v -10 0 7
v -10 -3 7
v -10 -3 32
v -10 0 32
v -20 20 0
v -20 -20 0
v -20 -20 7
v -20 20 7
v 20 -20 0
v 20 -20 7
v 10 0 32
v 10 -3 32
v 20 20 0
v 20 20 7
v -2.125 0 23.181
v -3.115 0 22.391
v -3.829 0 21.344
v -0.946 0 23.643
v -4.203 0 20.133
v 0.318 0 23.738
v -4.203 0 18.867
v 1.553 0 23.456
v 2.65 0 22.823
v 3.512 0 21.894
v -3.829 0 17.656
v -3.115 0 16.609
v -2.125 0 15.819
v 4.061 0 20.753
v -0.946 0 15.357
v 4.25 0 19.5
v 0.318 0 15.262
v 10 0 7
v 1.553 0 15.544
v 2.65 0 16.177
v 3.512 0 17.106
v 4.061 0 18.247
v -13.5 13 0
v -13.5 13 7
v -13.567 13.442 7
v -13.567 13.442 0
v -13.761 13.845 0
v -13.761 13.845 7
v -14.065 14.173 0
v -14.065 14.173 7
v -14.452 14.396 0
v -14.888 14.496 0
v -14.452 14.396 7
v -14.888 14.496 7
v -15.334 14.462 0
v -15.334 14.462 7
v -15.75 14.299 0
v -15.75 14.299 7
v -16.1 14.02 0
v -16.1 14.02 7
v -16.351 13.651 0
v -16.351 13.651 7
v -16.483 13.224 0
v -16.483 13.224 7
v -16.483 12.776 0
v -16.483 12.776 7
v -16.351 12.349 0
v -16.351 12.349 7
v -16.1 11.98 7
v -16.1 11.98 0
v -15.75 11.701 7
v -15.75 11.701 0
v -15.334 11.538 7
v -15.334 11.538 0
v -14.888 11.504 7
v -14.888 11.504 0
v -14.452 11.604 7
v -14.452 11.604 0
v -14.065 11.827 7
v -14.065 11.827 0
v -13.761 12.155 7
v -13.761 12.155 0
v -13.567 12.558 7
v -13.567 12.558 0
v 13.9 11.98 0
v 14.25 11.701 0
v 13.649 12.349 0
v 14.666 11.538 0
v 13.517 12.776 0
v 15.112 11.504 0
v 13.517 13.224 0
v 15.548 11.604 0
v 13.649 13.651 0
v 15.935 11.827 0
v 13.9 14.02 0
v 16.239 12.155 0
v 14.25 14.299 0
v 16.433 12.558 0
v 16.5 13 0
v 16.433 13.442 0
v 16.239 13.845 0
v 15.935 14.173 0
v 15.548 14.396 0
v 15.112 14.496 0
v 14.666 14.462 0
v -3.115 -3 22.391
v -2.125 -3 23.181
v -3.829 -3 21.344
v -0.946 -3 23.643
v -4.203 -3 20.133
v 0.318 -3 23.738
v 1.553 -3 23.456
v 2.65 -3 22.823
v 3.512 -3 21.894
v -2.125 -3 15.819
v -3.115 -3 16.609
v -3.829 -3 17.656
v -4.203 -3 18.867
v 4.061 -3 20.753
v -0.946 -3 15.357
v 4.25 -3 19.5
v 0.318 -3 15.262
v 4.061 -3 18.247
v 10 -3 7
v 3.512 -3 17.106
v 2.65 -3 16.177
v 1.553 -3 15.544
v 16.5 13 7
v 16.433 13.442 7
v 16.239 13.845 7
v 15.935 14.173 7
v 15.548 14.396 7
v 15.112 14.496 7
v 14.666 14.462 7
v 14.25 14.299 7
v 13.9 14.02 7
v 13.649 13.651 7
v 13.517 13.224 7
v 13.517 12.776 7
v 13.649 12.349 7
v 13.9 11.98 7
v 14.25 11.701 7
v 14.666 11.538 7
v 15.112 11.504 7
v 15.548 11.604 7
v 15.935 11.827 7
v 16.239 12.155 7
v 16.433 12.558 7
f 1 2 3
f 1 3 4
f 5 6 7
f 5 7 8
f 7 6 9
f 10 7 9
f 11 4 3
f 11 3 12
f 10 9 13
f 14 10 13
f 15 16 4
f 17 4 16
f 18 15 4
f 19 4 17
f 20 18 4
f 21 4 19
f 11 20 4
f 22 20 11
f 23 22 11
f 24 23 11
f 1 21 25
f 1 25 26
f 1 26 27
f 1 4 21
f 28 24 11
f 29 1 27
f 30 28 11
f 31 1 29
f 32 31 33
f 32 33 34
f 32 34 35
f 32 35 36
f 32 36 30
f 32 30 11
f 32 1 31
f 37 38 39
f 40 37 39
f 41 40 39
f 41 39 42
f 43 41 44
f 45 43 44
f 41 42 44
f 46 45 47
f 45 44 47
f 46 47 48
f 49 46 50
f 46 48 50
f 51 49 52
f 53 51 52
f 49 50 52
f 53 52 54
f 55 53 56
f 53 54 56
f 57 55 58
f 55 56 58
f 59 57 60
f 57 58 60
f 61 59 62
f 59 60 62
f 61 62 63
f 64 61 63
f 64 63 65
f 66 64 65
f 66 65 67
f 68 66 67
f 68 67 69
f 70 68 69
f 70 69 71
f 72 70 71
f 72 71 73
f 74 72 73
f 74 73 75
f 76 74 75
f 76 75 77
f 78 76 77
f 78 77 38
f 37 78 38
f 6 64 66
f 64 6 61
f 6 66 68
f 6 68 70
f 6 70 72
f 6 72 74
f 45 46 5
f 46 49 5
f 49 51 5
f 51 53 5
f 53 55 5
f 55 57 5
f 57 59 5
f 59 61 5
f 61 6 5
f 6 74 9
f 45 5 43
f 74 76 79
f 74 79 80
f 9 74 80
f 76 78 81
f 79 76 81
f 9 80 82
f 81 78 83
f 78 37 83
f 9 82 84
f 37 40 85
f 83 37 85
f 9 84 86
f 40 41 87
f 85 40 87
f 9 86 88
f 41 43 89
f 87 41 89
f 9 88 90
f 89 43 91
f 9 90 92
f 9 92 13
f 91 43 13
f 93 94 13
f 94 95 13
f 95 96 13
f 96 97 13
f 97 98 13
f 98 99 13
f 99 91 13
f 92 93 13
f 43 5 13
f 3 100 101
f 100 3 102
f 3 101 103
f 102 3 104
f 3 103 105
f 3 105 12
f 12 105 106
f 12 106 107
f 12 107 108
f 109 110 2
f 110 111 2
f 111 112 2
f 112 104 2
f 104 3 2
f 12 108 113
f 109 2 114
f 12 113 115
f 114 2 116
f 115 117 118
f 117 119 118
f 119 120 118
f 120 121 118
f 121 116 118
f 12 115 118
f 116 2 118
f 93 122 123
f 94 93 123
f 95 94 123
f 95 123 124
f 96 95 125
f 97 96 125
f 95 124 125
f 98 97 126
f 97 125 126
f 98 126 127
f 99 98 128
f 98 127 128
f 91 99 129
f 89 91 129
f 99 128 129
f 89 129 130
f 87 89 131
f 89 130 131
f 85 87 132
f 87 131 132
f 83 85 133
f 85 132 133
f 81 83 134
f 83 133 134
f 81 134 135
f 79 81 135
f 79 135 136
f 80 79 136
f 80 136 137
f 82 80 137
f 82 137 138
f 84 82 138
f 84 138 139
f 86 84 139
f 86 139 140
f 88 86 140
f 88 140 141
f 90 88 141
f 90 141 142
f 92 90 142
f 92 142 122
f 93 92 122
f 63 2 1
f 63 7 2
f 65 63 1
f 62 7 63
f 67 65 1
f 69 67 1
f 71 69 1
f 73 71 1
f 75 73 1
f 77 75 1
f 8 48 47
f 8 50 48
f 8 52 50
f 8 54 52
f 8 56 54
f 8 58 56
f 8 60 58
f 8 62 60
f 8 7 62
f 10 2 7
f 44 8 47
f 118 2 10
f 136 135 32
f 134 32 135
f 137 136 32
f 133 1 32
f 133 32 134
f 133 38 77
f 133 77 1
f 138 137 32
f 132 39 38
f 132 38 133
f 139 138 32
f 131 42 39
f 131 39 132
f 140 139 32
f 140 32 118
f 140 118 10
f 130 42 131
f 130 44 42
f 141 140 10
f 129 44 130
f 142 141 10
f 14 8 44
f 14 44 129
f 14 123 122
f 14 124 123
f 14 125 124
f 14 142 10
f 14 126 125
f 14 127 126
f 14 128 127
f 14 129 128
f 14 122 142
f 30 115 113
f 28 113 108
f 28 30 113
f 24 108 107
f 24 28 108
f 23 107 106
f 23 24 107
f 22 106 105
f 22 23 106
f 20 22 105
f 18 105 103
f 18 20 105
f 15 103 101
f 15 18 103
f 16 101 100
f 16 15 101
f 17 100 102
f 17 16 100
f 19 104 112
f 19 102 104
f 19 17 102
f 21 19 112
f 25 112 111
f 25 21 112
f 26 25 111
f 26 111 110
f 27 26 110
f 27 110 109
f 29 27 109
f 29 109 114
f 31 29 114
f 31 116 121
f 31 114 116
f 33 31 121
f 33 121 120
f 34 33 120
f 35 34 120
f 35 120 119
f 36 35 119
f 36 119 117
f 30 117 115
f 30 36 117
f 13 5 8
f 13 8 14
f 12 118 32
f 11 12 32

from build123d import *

# Parameters (mm, degrees)
F0_W     = 40
F0_H     = 40
F1_DEPTH = 7
F3_W     = 20
F3_H     = 3
F4_DEPTH = 25
F5_R     = 1.5
F6_DEPTH = 25
F7_R     = 4.25
F8_DEPTH = 25


with BuildPart() as f1:
    # F0 (on Top) → F1 (new body)
    with BuildSketch(Plane.XY):
        Rectangle(F0_W, F0_H)
    extrude(amount=F1_DEPTH)

    # F3 (on offset) → F4 (join)
    with BuildSketch(Plane.XY.offset(7)):
        with Locations((0, -1.5)):
            Rectangle(F3_W, F3_H)
    extrude(amount=F4_DEPTH)

    # F5 (on offset) → F6 (cut)
    with BuildSketch(Plane.XY.offset(7)):
        with Locations((-15, 13)):
            Circle(F5_R)
        with Locations((15, 13)):
            Circle(F5_R)
    extrude(amount=-F6_DEPTH, mode=Mode.SUBTRACT)

    # F7 (on Front) → F8 (cut)
    with BuildSketch(Plane.XZ):
        with Locations((0, 19.5)):
            Circle(F7_R)
    extrude(amount=F8_DEPTH, mode=Mode.SUBTRACT)


solid = f1.part
